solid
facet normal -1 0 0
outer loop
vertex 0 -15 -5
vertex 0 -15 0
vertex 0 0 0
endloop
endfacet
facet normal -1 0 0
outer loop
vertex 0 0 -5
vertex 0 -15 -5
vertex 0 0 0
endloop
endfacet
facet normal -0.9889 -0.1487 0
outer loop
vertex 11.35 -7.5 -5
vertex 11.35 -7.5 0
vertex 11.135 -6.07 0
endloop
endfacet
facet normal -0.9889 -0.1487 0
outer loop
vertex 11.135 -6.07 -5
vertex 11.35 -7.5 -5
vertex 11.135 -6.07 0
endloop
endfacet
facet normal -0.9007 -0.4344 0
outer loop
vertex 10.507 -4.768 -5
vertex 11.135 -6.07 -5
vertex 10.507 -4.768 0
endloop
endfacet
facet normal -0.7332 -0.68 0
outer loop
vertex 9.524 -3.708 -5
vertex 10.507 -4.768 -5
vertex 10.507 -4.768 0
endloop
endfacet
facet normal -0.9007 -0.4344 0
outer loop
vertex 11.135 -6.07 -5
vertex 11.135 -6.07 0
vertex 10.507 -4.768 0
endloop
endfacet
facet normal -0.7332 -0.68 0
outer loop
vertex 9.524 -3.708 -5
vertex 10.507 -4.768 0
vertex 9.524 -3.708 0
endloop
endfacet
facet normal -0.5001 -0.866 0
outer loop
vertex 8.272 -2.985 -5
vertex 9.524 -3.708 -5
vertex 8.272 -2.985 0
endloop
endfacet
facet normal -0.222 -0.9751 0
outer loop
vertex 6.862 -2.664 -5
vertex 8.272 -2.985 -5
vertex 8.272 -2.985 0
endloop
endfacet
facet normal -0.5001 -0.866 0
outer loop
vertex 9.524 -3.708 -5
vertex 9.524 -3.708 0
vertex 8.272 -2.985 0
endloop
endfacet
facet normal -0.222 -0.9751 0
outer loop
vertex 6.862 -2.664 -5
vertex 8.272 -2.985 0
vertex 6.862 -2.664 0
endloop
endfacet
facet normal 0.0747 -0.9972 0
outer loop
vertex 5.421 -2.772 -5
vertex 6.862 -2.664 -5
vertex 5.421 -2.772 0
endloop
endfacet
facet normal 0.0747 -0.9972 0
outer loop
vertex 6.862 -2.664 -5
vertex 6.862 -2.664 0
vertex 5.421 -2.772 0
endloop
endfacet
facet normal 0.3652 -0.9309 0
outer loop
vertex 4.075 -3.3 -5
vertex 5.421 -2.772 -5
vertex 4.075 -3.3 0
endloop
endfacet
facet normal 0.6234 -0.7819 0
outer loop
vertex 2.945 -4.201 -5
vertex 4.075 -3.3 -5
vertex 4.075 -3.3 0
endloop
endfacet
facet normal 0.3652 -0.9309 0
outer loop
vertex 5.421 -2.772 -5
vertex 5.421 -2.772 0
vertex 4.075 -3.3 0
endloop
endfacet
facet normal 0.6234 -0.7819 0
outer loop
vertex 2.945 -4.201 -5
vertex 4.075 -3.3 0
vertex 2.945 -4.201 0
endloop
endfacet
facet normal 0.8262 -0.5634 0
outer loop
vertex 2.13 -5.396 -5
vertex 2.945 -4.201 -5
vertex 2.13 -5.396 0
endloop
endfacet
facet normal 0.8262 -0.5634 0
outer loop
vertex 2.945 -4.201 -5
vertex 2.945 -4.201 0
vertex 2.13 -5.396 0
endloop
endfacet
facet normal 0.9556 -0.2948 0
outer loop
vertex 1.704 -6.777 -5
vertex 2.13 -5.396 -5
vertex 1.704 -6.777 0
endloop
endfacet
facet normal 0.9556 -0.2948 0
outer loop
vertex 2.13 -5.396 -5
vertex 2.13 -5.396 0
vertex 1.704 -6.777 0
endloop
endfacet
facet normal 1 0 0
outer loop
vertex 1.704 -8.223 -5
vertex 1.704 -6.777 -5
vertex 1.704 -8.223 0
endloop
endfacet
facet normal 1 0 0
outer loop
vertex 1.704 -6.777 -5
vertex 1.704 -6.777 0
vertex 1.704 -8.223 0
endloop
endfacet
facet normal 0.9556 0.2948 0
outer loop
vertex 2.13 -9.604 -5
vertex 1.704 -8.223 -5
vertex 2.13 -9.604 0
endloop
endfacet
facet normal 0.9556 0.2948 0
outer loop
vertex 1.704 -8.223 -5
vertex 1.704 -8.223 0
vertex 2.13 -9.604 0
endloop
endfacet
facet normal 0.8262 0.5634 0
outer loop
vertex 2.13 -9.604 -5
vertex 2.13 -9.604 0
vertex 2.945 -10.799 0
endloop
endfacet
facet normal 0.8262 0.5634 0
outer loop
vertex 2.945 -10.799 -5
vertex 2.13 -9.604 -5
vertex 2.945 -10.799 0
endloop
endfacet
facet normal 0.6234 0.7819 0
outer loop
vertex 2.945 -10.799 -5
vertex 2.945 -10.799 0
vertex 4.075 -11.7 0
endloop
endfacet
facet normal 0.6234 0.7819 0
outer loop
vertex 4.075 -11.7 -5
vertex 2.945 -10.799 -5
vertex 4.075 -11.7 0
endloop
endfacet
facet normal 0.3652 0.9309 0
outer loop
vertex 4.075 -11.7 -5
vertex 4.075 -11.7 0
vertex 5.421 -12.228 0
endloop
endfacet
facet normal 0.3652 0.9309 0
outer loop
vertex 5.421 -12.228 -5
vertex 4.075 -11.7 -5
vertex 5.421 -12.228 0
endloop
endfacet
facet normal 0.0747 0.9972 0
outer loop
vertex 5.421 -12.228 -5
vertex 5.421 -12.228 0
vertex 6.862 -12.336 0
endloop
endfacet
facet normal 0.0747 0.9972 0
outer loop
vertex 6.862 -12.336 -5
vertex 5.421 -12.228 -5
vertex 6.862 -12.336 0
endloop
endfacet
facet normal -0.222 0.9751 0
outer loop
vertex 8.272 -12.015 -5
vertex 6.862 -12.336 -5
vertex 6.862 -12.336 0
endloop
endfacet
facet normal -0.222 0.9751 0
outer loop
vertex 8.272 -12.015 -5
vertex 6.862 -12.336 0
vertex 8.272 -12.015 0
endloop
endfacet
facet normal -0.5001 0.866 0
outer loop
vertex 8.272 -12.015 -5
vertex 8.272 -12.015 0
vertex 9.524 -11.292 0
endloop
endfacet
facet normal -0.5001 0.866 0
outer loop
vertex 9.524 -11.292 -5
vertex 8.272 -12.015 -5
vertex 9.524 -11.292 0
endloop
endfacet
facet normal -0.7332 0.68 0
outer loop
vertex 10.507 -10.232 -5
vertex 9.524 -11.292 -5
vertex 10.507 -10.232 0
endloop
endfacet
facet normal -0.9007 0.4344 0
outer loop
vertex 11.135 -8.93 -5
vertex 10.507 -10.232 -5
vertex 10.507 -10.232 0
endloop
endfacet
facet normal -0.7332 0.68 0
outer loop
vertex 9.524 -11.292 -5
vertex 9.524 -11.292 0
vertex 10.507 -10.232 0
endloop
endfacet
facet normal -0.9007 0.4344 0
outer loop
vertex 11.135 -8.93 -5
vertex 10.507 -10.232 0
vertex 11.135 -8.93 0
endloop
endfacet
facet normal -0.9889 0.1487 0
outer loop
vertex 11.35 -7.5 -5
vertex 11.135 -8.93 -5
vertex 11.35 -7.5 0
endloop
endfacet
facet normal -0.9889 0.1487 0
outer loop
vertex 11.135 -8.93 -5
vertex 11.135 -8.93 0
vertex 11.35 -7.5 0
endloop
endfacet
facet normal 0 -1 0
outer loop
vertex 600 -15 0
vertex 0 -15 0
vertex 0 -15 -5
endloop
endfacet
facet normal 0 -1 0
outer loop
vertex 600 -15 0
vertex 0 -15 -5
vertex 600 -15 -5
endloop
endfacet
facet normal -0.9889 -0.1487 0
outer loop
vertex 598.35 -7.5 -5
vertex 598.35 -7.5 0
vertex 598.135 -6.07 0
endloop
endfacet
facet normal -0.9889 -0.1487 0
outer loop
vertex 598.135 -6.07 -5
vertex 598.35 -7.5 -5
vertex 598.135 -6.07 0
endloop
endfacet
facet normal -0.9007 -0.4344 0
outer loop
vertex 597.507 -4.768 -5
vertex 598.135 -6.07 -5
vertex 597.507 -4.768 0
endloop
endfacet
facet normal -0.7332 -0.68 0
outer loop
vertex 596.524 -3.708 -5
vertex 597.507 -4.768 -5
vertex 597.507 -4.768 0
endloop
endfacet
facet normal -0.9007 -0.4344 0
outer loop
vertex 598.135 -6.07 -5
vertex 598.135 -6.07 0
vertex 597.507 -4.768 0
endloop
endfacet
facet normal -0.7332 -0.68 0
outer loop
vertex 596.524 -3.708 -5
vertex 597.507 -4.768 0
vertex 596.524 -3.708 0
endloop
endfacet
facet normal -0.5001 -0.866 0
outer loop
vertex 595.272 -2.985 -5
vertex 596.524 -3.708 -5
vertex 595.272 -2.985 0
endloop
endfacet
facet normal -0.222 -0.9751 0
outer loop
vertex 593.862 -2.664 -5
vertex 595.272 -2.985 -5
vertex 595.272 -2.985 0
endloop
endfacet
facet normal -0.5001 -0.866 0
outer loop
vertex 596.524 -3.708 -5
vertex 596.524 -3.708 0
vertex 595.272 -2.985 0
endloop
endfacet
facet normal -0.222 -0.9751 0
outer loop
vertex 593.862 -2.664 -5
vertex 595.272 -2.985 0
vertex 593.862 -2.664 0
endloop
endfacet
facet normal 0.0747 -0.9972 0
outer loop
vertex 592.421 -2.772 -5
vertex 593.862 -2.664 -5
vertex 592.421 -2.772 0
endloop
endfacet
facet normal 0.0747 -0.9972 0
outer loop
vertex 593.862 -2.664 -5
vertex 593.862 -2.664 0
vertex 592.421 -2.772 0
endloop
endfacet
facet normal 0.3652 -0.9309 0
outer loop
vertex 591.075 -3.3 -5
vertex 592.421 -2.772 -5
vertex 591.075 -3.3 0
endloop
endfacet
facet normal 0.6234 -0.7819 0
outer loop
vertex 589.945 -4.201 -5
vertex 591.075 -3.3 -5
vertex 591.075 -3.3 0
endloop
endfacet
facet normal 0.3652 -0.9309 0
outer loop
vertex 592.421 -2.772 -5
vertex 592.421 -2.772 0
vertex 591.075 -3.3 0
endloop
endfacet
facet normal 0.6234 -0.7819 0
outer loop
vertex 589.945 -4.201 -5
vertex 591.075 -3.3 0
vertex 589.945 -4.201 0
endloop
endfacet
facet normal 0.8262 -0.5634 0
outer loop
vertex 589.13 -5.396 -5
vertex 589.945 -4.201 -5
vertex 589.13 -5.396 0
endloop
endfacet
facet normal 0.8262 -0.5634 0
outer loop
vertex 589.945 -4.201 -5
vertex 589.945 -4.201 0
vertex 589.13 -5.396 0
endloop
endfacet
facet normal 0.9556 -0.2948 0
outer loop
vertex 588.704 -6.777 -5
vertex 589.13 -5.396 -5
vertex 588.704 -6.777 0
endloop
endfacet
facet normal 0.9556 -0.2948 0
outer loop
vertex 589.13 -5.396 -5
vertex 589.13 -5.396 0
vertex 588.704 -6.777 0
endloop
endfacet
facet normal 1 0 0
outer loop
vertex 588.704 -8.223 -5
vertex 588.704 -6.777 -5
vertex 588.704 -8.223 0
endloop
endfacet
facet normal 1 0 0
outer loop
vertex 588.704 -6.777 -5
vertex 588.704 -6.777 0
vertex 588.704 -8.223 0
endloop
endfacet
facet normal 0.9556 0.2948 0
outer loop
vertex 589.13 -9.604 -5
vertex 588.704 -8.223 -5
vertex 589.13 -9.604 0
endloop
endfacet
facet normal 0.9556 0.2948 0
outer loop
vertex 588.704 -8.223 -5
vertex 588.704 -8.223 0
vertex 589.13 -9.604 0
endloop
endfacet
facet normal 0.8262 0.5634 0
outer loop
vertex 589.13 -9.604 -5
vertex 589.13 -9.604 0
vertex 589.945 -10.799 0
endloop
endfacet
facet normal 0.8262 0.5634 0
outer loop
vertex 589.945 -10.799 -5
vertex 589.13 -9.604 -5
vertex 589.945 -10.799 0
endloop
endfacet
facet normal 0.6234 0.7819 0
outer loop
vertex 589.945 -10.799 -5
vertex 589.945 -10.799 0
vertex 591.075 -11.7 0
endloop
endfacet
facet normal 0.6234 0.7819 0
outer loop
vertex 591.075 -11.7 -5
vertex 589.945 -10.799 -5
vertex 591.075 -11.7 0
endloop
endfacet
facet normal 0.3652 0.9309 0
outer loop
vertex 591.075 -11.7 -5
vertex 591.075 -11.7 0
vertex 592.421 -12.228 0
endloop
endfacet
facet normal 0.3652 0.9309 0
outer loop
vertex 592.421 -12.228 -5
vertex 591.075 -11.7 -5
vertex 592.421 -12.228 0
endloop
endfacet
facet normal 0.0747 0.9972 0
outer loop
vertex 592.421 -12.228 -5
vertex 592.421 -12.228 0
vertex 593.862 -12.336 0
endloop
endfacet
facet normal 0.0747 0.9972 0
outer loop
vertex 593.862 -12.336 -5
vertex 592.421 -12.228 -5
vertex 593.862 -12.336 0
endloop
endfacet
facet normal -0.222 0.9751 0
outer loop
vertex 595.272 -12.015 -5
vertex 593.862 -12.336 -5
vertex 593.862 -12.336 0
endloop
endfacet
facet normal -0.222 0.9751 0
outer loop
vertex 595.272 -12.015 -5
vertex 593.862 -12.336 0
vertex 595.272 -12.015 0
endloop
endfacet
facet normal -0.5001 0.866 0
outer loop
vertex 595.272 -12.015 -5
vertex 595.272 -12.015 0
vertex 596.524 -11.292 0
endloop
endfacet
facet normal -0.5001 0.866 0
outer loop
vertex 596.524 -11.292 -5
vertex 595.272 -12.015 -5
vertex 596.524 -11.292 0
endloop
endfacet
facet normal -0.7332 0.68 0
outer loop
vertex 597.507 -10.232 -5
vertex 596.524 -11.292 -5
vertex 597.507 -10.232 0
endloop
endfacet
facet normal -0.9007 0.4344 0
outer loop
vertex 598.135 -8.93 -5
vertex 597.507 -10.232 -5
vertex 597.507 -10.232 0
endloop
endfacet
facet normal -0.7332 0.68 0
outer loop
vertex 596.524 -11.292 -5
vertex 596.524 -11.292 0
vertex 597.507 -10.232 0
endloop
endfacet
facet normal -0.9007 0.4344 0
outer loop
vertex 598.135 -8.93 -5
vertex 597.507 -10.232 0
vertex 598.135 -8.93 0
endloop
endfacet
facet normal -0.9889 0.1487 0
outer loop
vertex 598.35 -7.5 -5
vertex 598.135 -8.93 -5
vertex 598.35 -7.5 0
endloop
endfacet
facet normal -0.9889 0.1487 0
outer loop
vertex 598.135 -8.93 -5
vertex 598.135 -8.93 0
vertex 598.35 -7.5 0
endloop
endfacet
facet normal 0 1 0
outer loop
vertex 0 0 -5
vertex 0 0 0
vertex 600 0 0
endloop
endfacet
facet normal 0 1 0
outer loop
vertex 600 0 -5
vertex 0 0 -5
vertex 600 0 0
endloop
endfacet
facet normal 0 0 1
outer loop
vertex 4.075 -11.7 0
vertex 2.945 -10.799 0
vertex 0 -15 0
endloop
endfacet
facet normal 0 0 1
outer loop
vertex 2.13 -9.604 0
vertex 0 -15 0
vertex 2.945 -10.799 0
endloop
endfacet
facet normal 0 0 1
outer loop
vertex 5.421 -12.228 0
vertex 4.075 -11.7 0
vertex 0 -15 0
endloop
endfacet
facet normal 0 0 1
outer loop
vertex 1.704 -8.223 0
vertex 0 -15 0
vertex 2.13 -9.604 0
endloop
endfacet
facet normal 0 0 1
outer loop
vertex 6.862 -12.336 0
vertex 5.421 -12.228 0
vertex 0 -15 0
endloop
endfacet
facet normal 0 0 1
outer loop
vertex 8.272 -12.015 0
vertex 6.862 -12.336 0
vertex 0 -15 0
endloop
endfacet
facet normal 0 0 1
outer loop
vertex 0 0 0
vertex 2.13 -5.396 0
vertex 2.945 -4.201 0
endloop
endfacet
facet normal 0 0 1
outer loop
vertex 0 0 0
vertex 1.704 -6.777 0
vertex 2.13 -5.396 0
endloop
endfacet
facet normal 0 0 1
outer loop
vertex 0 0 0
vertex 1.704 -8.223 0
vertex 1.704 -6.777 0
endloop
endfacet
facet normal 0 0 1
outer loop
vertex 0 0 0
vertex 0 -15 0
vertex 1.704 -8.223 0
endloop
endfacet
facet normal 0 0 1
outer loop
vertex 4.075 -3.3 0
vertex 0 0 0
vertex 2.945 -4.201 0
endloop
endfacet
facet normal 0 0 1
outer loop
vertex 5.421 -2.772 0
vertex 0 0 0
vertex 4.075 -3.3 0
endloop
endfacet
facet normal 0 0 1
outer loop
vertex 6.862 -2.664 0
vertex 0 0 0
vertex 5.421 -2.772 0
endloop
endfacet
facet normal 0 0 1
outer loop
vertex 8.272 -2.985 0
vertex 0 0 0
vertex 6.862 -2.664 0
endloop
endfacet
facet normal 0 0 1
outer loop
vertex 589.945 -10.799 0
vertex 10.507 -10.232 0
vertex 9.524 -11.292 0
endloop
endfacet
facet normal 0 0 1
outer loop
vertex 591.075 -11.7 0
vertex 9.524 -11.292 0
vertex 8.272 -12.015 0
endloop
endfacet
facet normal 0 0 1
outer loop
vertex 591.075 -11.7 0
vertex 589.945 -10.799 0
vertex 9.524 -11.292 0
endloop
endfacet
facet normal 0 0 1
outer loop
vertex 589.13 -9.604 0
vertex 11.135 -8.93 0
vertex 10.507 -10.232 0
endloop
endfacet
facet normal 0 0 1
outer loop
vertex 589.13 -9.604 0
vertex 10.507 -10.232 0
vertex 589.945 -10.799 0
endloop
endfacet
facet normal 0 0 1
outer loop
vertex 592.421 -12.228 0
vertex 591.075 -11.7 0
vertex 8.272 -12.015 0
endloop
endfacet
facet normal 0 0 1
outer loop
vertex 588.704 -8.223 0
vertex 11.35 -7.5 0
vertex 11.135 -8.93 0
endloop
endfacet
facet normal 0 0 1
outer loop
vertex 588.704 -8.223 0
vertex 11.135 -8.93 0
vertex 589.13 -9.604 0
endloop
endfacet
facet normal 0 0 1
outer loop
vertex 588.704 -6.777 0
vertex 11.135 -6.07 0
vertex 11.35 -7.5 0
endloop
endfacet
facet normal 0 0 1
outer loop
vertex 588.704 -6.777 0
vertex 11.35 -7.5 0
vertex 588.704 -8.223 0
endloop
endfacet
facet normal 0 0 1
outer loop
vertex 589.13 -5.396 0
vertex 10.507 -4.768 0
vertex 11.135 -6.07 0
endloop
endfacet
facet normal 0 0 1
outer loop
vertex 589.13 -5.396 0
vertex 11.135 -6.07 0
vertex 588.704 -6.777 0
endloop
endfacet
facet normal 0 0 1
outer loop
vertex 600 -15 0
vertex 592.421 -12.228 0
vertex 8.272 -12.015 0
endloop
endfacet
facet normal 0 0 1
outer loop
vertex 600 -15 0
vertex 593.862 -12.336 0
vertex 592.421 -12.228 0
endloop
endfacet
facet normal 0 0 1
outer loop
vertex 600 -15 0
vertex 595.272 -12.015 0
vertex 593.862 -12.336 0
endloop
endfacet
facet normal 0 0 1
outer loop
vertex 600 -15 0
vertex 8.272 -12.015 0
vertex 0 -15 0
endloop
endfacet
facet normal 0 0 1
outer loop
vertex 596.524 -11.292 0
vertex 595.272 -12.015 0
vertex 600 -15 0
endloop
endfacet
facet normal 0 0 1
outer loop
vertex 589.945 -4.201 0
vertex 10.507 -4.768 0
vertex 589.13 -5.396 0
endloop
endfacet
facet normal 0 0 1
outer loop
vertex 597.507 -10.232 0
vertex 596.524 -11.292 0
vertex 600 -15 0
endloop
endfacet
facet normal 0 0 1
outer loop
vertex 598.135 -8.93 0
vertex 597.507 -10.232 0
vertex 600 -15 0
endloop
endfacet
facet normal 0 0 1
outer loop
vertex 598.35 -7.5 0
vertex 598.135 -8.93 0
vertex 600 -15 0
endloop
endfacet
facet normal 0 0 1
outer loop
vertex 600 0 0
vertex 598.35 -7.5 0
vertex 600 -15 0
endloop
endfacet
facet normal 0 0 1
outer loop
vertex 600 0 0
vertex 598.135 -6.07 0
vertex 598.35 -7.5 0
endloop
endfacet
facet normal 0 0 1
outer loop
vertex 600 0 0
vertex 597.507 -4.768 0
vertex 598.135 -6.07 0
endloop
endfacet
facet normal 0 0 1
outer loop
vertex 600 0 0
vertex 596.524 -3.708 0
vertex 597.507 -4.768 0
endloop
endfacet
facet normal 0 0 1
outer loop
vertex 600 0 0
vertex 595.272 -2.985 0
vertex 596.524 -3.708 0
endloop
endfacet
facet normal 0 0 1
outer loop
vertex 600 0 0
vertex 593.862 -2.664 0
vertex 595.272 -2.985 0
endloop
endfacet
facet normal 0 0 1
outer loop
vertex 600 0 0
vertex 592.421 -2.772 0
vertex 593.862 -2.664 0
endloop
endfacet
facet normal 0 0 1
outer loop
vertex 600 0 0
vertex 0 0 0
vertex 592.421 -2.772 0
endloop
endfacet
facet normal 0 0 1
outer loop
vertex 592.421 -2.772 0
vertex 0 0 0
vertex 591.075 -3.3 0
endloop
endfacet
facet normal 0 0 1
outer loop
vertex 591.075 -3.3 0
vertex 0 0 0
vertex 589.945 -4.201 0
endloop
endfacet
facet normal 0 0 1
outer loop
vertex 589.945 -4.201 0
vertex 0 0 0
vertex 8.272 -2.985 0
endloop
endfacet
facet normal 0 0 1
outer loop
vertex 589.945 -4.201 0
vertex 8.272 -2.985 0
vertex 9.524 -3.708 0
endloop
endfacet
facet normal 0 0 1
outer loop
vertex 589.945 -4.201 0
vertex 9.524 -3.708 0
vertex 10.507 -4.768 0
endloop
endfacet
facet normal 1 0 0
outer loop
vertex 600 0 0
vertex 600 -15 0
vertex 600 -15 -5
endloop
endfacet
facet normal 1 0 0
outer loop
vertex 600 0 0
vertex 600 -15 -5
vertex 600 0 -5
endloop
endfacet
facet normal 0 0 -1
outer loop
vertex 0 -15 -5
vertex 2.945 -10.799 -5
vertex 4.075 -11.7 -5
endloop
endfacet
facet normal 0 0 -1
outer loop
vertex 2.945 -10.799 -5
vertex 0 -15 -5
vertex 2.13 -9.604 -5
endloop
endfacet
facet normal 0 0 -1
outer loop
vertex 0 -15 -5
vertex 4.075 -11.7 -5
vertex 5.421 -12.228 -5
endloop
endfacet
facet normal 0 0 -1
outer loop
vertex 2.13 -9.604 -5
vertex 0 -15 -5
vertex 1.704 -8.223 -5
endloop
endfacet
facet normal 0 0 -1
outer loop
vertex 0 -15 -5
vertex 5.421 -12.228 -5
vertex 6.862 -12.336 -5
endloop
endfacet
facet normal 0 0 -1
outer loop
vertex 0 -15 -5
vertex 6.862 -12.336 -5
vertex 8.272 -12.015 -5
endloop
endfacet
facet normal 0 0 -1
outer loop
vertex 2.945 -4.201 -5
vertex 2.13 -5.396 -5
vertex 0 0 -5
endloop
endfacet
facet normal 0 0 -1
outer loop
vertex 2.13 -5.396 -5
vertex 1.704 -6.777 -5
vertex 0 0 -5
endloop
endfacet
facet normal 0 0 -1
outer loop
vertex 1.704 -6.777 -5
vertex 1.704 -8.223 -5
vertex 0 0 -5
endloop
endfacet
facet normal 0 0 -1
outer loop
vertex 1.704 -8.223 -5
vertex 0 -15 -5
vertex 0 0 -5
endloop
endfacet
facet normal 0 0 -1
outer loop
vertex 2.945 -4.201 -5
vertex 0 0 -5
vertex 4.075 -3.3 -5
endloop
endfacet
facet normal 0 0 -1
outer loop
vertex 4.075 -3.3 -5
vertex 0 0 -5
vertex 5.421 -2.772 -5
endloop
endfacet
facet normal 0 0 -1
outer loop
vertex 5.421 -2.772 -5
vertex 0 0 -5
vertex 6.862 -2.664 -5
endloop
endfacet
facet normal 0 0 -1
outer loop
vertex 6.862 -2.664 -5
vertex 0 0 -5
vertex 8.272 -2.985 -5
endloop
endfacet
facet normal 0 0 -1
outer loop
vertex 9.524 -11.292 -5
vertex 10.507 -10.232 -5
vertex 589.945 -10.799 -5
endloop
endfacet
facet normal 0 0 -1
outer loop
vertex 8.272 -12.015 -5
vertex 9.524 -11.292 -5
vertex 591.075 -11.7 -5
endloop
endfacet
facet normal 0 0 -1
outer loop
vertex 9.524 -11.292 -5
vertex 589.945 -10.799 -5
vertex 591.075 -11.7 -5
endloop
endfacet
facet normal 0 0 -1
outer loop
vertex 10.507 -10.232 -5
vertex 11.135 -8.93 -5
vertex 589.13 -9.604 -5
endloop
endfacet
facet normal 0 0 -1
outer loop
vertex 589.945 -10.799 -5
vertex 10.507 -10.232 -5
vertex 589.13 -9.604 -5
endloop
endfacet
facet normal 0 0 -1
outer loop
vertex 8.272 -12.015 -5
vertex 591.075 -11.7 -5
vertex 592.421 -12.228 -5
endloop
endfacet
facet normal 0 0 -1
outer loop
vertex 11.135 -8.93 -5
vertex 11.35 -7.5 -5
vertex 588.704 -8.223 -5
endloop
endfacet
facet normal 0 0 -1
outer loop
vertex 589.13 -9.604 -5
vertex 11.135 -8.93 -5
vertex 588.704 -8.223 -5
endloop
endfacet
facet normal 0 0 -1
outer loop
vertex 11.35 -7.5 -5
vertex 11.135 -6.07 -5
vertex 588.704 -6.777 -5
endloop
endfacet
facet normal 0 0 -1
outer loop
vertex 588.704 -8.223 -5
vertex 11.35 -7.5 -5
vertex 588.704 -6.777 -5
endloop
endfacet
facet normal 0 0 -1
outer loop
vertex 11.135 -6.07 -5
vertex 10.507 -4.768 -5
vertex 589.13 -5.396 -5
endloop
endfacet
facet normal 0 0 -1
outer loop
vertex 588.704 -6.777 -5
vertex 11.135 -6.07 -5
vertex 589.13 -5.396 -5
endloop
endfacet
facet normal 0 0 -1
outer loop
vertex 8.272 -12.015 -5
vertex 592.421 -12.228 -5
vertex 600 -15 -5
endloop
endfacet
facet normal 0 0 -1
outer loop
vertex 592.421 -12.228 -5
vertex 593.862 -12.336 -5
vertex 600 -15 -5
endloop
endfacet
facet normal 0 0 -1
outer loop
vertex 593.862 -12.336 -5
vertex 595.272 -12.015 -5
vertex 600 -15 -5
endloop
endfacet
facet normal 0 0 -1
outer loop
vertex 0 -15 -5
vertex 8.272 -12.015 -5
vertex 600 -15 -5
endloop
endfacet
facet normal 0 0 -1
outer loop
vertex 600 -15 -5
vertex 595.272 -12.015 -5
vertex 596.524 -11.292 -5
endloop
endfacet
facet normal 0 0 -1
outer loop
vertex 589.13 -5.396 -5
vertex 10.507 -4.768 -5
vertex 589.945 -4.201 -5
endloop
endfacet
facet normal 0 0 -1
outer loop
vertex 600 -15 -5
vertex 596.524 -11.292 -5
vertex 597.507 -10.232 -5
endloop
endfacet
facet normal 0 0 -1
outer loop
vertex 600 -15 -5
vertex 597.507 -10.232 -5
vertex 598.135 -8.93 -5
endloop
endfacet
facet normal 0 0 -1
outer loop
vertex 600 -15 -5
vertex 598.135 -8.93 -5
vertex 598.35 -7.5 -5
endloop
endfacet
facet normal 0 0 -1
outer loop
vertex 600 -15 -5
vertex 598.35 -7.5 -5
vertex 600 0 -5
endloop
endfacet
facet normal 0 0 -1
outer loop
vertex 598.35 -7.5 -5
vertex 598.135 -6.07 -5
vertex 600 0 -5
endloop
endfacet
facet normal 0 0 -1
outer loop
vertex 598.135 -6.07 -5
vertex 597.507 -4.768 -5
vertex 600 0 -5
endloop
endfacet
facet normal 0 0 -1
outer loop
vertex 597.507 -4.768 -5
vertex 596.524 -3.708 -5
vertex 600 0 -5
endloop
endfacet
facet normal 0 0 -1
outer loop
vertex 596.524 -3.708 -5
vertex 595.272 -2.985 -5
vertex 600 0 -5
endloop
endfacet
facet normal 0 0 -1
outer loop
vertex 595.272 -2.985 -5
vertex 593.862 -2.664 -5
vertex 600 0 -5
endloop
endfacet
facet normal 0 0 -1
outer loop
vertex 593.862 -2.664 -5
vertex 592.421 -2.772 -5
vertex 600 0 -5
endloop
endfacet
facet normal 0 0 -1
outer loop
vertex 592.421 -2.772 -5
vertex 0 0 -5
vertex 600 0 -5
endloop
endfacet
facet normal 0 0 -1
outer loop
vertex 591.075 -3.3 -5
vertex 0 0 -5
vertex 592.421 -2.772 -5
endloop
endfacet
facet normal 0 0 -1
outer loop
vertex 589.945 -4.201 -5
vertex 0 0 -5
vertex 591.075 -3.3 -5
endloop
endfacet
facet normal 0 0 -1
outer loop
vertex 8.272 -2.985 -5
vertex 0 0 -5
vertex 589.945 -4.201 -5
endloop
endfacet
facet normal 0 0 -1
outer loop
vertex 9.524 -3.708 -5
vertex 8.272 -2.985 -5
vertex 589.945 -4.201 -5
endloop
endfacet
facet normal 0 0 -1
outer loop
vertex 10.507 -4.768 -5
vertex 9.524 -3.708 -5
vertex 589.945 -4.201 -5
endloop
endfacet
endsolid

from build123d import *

# Parameters (mm, degrees)
SKETCH1_W           = 600
SKETCH1_H           = 15
SKETCH1_R           = 4.85
BOSS_EXTRUDE1_DEPTH = 5


with BuildPart() as part:
    # Sketch1 → Boss-Extrude1 (new body)
    with BuildSketch(Plane.XY):
        with Locations((300, -7.5)):
            Rectangle(SKETCH1_W, SKETCH1_H)
        with Locations((6.5, -7.5)):
            Circle(SKETCH1_R, mode=Mode.SUBTRACT)
        with Locations((593.5, -7.5)):
            Circle(SKETCH1_R, mode=Mode.SUBTRACT)
    extrude(amount=-BOSS_EXTRUDE1_DEPTH)


solid = part.part
